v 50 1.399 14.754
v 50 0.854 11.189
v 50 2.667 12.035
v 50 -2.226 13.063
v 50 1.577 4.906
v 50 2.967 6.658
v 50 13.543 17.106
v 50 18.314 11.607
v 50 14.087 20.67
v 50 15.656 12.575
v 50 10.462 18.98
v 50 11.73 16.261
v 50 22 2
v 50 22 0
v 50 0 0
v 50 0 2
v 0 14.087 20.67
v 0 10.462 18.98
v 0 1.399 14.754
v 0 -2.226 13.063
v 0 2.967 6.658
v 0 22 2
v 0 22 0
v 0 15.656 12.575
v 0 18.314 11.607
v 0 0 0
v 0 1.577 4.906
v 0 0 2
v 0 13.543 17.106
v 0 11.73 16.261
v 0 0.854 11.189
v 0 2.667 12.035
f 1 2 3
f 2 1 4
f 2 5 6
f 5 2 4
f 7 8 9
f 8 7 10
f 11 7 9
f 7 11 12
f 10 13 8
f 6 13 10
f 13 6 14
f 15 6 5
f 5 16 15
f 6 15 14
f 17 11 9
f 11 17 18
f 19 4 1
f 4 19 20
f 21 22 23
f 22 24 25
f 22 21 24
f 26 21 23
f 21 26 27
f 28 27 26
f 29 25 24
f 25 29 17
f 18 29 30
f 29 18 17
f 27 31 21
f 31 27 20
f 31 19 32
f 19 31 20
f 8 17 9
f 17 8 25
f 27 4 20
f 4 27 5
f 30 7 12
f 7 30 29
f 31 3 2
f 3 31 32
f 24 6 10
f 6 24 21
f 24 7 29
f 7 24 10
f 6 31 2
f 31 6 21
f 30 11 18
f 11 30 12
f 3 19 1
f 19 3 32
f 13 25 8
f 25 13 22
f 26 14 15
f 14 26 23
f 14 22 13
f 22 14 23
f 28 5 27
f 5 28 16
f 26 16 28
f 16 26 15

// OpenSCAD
space = 1;
stripZ = 4;
stripY = 12;
stripX = 50;
stripYCutOut = 10;
stripHolderThickness = 2;
stripAngle = 25;
holderZ = 2;
holderBaseY = 4;
holderBaseZ = 2;

union(){
    hull() {
        holderBase();
        translate([0,holderBaseY/2, holderBaseZ + holderBaseZ]) rotate(a=[stripAngle,0,0]) cube([stripX, stripY + 2*space + 2*stripHolderThickness, 1]);
    }
    translate([0,holderBaseY/2, holderBaseZ + holderBaseZ]) rotate(a=[stripAngle,0,0]) ledHolder();
}


module holderBase() {
    union() {
        cube([stripX, stripY + 2*space + 2*stripHolderThickness + holderBaseY, holderBaseZ]);
        translate([0, holderBaseY / 2, holderBaseZ]) cube([stripX, stripY + 2*space + 2*stripHolderThickness, holderZ]);
    }
}

module ledHolder() {
    difference() {
        cube([stripX, stripY + 2*space + 2*stripHolderThickness, stripZ + 2*space + 2*stripHolderThickness]);
        translate([0, stripHolderThickness, stripHolderThickness]) cube([stripX, stripY + 2*space, stripZ + space]);
        translate([0, (stripY - stripYCutOut)/2 + space + stripHolderThickness, stripZ + space + stripHolderThickness]) cube([stripX, stripYCutOut, space + stripHolderThickness]);
    }
}
